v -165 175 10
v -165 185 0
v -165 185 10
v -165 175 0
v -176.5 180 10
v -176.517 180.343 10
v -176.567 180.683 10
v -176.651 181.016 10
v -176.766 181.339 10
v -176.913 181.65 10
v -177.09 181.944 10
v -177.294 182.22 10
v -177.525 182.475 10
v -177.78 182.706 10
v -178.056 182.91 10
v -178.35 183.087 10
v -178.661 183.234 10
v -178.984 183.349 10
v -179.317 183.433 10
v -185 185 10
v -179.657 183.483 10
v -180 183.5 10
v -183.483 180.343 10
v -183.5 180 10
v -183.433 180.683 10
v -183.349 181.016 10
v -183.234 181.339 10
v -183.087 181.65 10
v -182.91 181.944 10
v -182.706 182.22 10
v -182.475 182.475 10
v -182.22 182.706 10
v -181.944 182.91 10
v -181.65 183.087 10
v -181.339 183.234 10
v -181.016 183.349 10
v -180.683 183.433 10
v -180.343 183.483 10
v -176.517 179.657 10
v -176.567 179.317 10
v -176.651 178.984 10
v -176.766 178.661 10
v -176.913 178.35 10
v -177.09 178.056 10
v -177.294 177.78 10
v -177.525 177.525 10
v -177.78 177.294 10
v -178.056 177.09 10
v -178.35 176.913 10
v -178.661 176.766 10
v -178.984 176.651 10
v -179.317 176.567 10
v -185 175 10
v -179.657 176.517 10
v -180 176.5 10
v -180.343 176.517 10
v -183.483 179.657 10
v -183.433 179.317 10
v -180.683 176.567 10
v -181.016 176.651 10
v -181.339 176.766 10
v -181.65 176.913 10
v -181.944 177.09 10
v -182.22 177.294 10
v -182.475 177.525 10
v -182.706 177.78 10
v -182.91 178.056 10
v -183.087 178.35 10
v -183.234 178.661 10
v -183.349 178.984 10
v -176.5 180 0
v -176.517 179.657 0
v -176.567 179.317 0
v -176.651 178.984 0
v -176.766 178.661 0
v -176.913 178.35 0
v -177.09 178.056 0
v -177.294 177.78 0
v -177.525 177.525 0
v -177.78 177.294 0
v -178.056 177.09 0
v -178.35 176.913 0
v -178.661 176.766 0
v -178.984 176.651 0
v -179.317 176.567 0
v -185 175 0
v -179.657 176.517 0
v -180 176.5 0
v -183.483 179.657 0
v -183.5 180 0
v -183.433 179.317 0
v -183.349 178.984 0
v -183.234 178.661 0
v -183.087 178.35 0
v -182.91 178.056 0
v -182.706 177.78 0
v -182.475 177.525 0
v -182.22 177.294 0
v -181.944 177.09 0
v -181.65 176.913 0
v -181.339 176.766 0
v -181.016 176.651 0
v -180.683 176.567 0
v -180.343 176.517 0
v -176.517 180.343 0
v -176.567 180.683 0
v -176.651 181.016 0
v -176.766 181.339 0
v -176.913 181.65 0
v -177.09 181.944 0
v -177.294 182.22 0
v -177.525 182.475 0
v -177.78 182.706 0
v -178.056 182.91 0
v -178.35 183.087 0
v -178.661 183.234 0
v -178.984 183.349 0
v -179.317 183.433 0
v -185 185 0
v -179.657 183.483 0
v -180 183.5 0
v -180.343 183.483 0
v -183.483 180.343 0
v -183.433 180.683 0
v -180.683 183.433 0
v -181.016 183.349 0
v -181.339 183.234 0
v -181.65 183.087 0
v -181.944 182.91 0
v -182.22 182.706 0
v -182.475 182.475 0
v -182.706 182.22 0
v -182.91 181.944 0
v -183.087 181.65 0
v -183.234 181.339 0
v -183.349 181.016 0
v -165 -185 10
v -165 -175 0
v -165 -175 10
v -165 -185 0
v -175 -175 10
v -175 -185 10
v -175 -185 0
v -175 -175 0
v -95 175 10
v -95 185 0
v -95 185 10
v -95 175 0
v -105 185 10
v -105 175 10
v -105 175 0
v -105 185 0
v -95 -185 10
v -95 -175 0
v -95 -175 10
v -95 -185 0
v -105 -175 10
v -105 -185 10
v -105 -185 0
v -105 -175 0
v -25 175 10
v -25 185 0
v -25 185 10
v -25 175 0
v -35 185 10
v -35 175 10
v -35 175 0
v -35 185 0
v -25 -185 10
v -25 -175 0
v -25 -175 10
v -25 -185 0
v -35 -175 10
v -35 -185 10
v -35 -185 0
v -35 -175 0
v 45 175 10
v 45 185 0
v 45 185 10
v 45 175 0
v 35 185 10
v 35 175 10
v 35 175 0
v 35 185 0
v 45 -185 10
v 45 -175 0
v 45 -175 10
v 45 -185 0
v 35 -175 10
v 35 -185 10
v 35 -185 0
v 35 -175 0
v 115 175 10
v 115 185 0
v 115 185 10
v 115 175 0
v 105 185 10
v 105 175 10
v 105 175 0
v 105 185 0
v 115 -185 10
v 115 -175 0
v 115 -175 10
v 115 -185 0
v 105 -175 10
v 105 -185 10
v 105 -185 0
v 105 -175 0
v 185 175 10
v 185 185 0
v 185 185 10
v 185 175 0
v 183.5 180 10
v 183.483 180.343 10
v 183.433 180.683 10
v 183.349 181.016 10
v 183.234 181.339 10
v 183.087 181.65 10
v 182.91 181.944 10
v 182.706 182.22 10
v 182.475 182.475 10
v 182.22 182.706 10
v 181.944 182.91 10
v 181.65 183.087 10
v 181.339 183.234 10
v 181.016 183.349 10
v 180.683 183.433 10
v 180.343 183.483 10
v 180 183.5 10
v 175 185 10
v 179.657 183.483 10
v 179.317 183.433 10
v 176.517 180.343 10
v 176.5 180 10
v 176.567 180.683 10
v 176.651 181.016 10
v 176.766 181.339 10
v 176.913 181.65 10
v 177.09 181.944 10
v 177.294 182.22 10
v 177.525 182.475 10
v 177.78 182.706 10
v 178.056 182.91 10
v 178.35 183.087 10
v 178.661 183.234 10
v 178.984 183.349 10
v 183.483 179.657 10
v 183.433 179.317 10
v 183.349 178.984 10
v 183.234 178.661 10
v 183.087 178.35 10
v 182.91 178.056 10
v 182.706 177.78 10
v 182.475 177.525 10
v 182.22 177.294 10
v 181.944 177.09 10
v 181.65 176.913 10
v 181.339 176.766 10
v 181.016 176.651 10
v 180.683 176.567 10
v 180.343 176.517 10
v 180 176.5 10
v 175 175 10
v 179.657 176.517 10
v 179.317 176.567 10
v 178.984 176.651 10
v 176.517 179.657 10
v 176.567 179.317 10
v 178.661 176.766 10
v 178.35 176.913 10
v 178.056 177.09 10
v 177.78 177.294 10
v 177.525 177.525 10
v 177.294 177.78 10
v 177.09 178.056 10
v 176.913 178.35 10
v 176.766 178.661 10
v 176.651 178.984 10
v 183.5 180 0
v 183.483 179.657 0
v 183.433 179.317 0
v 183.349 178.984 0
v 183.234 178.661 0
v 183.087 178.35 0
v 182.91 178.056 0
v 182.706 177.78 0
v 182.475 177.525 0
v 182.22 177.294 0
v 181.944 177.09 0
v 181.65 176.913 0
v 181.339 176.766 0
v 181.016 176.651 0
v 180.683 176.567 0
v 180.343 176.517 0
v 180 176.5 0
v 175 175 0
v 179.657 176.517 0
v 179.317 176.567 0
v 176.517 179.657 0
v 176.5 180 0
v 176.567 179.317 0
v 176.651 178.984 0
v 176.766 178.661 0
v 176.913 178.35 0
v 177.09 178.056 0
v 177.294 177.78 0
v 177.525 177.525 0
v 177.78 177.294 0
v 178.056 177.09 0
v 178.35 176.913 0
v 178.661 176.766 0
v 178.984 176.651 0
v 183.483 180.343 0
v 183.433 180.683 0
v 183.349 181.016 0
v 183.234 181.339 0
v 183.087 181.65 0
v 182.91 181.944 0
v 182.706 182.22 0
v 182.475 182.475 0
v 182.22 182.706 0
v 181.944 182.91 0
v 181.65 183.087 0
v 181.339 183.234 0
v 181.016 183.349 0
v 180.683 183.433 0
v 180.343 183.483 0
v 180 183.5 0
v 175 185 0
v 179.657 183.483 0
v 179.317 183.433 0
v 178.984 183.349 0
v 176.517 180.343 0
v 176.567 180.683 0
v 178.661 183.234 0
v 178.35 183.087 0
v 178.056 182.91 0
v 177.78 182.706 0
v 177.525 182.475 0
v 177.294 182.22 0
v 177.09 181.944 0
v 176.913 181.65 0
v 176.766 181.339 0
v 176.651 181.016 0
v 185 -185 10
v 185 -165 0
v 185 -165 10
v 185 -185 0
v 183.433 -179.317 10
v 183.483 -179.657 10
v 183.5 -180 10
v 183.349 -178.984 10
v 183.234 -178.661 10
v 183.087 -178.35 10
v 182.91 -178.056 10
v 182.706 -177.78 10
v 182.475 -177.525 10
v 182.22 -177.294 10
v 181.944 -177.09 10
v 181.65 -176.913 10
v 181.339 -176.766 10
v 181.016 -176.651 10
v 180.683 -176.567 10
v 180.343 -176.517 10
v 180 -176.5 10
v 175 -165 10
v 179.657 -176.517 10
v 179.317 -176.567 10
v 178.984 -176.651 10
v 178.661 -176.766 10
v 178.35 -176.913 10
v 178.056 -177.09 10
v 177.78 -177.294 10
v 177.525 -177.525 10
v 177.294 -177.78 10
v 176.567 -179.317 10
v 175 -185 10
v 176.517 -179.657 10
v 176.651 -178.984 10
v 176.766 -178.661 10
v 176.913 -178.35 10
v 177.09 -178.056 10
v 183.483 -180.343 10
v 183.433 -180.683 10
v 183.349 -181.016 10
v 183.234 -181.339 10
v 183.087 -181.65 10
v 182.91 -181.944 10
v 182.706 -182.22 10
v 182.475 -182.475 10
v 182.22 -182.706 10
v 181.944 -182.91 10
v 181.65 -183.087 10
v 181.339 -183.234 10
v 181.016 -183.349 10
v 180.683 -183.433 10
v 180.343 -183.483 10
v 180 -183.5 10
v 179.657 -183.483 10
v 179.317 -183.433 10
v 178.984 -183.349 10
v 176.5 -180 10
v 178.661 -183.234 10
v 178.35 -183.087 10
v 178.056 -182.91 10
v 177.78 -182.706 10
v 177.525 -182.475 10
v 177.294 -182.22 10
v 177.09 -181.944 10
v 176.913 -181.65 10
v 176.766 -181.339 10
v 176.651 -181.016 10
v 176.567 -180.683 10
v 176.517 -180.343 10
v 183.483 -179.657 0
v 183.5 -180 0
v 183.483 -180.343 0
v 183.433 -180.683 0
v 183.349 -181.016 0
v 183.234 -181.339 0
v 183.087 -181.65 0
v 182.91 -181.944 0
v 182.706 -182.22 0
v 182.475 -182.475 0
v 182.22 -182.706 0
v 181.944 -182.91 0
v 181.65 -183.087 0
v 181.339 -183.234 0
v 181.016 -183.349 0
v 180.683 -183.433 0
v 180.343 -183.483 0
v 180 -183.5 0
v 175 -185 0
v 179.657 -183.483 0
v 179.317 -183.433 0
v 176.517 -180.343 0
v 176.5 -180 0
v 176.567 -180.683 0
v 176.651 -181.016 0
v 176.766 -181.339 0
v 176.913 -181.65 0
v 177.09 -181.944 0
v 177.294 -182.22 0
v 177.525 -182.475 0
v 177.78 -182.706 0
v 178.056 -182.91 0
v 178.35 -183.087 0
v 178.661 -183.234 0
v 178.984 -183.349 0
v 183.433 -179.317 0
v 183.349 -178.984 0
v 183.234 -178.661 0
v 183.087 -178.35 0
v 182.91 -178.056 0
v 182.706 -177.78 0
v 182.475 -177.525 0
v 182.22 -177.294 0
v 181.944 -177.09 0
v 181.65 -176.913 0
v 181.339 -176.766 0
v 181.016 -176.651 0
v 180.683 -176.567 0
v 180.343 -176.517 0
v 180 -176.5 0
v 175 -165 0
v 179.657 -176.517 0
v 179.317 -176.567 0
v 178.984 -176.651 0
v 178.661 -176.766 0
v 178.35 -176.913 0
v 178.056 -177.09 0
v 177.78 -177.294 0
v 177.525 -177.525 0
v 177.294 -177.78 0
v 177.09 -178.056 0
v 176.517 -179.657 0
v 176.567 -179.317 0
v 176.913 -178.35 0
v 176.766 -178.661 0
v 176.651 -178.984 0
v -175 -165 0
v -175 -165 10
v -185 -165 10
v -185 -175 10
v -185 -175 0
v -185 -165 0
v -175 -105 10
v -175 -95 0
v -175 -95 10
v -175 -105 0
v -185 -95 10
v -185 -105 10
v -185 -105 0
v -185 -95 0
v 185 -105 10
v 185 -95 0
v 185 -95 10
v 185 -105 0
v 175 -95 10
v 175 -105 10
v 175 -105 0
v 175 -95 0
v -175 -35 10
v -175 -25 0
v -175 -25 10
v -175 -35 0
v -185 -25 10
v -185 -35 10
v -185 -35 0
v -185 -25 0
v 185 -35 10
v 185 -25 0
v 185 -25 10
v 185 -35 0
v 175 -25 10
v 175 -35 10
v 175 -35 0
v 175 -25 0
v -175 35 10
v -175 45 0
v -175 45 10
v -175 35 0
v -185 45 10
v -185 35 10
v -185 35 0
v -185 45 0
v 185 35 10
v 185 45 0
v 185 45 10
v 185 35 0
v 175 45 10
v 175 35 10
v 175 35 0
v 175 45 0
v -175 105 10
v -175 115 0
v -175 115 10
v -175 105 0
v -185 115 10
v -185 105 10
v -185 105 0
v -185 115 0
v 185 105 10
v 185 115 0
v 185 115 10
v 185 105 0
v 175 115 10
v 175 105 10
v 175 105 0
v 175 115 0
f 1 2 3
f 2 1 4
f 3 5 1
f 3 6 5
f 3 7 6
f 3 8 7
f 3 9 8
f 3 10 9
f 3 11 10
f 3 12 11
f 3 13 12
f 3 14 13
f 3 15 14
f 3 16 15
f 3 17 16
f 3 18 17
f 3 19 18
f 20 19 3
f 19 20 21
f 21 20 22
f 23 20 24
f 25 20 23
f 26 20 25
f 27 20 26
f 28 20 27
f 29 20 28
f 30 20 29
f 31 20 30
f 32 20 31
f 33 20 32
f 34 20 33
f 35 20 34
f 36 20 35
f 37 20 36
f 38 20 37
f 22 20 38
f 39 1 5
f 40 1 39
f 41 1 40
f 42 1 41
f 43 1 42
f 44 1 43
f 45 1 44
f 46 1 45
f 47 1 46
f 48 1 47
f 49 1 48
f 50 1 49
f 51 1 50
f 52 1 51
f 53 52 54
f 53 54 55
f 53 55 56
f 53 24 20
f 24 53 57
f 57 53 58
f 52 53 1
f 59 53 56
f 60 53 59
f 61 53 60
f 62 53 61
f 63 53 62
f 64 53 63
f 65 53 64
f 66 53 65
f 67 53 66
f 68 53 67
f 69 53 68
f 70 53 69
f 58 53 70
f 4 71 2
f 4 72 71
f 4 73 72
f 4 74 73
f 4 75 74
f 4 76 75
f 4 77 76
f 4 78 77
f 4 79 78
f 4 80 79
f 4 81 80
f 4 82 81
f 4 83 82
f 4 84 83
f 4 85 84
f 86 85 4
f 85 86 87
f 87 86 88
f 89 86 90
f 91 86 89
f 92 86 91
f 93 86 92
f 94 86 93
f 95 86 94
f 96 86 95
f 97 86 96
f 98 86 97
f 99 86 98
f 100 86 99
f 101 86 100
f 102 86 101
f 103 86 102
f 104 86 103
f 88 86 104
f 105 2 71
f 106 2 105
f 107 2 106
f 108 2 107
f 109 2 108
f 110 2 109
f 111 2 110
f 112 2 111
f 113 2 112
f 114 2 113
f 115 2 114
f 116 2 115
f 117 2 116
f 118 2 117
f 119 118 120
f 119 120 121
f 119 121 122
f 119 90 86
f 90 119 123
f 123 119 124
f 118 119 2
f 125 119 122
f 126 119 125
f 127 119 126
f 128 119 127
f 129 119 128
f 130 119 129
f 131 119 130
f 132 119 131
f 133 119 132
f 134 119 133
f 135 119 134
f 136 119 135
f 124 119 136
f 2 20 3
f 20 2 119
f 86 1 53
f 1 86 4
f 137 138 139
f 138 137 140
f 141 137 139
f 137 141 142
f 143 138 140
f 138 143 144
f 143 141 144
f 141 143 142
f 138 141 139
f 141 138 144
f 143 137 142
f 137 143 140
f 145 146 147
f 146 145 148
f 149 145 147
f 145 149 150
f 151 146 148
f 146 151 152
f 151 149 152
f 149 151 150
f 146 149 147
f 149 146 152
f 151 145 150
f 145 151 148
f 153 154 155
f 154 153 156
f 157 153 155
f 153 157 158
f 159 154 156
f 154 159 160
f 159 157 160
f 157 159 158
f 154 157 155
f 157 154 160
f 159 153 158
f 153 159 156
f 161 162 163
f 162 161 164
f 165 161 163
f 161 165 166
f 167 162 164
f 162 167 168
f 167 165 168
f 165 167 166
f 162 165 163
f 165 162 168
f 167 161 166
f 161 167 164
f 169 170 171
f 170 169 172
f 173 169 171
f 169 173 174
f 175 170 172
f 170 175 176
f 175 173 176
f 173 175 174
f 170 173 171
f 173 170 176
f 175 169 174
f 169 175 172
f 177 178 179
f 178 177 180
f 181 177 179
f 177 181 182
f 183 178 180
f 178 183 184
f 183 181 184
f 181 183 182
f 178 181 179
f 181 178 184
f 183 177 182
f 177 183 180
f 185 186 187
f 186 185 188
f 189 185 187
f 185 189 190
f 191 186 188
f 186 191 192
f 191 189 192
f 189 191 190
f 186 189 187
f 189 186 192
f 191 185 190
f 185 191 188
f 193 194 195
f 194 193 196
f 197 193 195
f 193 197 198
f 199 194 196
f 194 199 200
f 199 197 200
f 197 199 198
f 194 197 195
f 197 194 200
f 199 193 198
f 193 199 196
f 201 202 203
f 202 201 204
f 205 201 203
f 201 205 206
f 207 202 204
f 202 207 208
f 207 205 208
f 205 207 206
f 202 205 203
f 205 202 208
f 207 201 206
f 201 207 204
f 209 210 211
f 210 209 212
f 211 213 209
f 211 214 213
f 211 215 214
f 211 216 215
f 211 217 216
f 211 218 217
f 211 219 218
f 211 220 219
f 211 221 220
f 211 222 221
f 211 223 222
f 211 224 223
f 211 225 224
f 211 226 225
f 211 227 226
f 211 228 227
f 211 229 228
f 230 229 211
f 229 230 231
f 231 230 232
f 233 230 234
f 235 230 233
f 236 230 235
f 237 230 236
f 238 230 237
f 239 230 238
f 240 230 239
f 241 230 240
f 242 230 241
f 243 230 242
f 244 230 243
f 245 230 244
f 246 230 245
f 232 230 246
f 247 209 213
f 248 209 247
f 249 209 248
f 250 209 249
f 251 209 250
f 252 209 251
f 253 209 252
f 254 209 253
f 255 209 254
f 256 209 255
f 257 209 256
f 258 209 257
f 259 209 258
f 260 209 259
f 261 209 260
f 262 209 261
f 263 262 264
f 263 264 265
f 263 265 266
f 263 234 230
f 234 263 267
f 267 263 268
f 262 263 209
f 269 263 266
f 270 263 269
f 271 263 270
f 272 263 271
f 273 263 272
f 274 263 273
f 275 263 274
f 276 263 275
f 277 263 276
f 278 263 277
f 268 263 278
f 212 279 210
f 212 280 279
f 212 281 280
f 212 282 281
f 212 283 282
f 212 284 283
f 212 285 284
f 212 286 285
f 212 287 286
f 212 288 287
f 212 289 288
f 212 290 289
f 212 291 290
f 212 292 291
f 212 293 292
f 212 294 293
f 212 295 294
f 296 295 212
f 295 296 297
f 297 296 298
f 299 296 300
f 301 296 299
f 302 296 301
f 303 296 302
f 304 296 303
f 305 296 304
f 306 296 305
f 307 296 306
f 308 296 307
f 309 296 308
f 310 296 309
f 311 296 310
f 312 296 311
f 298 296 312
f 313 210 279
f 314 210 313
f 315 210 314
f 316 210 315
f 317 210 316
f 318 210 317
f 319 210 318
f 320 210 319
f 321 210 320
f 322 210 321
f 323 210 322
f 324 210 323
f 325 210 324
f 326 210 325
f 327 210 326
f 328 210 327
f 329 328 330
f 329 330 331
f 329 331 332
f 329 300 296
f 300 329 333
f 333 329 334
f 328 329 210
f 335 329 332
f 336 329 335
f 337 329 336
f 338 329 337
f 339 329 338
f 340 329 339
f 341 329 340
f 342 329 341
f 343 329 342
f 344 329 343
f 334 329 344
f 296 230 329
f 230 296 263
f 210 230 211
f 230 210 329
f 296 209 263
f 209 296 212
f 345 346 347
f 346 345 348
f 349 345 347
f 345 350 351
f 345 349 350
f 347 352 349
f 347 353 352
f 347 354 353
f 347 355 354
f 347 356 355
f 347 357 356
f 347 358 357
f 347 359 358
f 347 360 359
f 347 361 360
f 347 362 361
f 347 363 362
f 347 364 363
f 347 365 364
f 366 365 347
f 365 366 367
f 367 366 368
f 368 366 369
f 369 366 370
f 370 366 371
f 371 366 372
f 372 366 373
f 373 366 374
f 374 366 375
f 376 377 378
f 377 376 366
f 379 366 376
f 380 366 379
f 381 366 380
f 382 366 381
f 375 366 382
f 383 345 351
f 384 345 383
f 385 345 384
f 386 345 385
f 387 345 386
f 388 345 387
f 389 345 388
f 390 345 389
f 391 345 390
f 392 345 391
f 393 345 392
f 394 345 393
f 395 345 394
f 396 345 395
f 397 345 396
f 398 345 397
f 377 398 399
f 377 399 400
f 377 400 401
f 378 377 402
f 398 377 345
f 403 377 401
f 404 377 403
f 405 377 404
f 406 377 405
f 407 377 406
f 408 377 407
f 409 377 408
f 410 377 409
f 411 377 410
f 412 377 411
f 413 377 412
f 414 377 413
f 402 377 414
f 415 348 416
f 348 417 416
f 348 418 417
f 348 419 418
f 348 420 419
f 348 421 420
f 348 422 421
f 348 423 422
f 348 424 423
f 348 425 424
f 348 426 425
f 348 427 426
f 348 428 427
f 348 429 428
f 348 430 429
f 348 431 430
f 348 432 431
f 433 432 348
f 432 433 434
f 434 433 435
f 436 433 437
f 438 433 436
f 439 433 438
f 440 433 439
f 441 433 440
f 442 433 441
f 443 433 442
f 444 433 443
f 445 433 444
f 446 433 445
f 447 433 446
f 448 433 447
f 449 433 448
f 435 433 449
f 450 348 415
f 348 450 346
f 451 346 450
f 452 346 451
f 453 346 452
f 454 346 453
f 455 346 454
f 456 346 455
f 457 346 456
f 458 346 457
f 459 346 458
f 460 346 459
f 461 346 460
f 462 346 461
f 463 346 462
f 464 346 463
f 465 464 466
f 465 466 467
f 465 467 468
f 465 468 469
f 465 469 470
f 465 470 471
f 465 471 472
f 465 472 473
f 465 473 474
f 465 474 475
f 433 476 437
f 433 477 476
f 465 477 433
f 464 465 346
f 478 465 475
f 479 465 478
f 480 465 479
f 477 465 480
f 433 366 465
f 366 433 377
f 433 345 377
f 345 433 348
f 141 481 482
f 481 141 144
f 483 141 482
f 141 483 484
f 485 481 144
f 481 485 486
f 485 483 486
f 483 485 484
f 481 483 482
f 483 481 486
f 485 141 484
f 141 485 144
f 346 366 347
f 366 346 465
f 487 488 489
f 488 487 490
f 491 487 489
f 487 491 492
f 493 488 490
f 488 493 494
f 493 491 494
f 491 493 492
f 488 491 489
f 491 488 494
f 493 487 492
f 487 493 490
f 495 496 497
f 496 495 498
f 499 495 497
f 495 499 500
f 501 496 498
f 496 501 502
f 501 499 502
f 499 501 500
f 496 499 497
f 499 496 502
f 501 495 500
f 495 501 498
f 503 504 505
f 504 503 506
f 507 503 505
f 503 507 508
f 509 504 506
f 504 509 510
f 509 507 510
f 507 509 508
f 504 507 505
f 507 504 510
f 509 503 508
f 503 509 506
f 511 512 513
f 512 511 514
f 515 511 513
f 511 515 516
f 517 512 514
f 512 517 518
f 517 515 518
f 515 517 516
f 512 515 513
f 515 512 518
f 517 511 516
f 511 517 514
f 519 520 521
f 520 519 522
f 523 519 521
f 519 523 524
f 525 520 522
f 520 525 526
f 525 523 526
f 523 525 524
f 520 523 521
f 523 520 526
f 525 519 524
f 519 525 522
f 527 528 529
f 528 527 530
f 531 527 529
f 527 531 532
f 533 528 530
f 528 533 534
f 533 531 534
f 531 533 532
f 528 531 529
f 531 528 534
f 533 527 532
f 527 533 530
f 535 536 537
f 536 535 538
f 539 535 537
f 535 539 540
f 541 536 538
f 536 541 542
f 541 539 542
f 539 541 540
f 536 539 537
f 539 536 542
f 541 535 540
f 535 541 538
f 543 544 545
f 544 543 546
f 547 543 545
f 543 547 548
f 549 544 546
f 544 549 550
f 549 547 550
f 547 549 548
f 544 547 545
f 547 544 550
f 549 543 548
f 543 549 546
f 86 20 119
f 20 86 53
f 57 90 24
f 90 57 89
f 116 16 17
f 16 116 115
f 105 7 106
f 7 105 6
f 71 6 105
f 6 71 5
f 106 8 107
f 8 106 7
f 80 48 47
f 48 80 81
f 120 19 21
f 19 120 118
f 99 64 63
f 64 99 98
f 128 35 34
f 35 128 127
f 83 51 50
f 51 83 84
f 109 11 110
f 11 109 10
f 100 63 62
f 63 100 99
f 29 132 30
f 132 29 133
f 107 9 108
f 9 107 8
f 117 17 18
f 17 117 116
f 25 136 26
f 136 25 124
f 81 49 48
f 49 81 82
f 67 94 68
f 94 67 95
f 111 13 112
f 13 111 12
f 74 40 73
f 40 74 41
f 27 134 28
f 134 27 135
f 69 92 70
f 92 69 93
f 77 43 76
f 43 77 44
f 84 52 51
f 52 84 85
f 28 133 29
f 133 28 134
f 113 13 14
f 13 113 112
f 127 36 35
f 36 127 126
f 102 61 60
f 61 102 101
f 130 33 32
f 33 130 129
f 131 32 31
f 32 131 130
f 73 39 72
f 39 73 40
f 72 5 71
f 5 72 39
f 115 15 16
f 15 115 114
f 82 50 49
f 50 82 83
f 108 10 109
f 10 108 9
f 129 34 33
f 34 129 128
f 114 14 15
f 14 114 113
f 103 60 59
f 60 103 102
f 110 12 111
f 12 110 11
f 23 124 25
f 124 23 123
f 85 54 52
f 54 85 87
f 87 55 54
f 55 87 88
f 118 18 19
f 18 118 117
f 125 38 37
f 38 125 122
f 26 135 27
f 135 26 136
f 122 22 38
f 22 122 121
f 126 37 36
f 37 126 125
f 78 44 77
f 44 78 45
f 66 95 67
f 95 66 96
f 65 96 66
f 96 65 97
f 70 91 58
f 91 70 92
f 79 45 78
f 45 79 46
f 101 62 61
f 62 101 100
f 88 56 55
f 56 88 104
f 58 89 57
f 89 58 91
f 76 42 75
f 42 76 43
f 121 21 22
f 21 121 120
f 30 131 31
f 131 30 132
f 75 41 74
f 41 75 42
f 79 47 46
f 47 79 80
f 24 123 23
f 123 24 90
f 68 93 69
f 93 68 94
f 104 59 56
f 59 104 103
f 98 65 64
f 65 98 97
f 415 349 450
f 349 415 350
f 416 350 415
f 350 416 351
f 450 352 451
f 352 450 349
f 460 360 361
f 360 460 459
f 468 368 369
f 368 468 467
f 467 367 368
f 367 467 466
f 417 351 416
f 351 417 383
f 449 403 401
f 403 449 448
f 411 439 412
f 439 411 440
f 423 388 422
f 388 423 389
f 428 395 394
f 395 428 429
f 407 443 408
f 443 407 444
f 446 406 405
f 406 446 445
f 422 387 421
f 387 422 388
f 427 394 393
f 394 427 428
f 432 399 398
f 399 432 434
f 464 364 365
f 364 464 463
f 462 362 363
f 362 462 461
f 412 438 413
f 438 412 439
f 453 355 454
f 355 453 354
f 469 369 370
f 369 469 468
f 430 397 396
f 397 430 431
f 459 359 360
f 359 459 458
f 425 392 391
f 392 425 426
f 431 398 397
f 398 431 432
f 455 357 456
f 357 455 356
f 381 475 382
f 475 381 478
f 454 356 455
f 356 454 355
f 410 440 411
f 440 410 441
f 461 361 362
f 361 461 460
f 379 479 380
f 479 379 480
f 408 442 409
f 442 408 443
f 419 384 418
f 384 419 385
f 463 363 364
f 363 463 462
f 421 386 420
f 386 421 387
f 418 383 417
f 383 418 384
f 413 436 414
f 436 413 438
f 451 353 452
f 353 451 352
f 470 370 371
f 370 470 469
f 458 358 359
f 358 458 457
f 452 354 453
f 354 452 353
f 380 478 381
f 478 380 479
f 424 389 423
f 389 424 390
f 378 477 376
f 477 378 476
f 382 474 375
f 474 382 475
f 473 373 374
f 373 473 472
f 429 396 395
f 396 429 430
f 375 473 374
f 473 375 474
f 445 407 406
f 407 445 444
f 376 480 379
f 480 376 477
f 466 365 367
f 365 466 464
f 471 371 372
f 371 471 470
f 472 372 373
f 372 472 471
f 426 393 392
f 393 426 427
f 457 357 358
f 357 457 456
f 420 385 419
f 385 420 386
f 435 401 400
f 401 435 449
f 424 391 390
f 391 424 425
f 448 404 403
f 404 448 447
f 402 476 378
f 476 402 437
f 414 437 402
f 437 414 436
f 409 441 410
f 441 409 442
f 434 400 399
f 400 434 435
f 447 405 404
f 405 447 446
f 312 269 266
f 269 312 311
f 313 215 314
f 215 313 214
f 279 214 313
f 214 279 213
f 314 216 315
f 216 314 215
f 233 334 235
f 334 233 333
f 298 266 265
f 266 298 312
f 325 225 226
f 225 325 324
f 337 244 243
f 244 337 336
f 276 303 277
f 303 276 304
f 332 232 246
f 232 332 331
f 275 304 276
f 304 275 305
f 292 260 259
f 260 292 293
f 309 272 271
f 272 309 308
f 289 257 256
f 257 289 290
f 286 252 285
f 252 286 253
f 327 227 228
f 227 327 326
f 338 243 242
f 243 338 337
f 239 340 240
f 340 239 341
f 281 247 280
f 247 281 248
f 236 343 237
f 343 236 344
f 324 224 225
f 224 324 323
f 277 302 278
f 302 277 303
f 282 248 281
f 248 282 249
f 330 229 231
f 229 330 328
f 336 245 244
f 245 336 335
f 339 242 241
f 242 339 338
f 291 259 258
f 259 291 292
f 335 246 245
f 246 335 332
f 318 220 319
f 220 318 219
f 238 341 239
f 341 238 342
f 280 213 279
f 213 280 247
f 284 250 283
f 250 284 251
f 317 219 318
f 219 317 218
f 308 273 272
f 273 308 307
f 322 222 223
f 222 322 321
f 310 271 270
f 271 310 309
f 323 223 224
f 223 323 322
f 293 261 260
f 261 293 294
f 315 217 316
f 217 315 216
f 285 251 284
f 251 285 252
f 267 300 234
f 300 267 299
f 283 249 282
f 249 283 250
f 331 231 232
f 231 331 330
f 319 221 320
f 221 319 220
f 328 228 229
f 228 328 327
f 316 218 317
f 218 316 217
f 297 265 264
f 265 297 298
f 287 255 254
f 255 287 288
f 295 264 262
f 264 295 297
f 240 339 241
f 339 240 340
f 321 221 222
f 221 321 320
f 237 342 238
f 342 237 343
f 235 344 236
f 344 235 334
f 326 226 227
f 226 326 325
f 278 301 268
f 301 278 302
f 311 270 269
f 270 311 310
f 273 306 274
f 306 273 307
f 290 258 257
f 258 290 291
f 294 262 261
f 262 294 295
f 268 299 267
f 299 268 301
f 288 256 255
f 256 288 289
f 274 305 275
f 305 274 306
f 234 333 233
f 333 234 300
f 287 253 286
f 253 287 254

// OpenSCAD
// ring_55.scad - ring index 55 (z bottom = 550 mm)
$fn = 64; bar = 10; half_b = bar/2; outer = 370; half_outer = outer/2;
front_y = 180; back_y = -180; left_x = -180; right_x = 180;
x_centers = [-170, -100, -30, 40, 110, 180];
z_centers = [5, 85, 155, 225, 295, 365, 435, 505, 575, 645, 715]; ring_z = 550;
module place_box(cx, cy, sx, sy) { translate([cx - sx/2, cy - sy/2, 0]) cube([sx, sy, bar]); }

difference() { union() {
    for (x = x_centers) { place_box(x, front_y, bar, bar); place_box(x, back_y, bar, bar); }
    for (y = x_centers) { place_box(left_x, y, bar, bar); place_box(right_x, y, bar, bar); }
    for (zc = z_centers) if ((zc - half_b < ring_z + bar) && (zc + half_b > ring_z)) {
        translate([-half_outer, front_y - half_b, 0]) cube([outer, bar, bar]);
        translate([-half_outer, back_y - half_b, 0])  cube([outer, bar, bar]);
        translate([left_x - half_b, -half_outer, 0])  cube([bar, outer, bar]);
        translate([right_x - half_b, -half_outer, 0]) cube([bar, outer, bar]);
    }
  }
  for (cx = [-180, 180]) for (cy = [-180, 180]) translate([cx, cy, 0]) cylinder(h = bar, r = 3.5, $fn = 64);
}
